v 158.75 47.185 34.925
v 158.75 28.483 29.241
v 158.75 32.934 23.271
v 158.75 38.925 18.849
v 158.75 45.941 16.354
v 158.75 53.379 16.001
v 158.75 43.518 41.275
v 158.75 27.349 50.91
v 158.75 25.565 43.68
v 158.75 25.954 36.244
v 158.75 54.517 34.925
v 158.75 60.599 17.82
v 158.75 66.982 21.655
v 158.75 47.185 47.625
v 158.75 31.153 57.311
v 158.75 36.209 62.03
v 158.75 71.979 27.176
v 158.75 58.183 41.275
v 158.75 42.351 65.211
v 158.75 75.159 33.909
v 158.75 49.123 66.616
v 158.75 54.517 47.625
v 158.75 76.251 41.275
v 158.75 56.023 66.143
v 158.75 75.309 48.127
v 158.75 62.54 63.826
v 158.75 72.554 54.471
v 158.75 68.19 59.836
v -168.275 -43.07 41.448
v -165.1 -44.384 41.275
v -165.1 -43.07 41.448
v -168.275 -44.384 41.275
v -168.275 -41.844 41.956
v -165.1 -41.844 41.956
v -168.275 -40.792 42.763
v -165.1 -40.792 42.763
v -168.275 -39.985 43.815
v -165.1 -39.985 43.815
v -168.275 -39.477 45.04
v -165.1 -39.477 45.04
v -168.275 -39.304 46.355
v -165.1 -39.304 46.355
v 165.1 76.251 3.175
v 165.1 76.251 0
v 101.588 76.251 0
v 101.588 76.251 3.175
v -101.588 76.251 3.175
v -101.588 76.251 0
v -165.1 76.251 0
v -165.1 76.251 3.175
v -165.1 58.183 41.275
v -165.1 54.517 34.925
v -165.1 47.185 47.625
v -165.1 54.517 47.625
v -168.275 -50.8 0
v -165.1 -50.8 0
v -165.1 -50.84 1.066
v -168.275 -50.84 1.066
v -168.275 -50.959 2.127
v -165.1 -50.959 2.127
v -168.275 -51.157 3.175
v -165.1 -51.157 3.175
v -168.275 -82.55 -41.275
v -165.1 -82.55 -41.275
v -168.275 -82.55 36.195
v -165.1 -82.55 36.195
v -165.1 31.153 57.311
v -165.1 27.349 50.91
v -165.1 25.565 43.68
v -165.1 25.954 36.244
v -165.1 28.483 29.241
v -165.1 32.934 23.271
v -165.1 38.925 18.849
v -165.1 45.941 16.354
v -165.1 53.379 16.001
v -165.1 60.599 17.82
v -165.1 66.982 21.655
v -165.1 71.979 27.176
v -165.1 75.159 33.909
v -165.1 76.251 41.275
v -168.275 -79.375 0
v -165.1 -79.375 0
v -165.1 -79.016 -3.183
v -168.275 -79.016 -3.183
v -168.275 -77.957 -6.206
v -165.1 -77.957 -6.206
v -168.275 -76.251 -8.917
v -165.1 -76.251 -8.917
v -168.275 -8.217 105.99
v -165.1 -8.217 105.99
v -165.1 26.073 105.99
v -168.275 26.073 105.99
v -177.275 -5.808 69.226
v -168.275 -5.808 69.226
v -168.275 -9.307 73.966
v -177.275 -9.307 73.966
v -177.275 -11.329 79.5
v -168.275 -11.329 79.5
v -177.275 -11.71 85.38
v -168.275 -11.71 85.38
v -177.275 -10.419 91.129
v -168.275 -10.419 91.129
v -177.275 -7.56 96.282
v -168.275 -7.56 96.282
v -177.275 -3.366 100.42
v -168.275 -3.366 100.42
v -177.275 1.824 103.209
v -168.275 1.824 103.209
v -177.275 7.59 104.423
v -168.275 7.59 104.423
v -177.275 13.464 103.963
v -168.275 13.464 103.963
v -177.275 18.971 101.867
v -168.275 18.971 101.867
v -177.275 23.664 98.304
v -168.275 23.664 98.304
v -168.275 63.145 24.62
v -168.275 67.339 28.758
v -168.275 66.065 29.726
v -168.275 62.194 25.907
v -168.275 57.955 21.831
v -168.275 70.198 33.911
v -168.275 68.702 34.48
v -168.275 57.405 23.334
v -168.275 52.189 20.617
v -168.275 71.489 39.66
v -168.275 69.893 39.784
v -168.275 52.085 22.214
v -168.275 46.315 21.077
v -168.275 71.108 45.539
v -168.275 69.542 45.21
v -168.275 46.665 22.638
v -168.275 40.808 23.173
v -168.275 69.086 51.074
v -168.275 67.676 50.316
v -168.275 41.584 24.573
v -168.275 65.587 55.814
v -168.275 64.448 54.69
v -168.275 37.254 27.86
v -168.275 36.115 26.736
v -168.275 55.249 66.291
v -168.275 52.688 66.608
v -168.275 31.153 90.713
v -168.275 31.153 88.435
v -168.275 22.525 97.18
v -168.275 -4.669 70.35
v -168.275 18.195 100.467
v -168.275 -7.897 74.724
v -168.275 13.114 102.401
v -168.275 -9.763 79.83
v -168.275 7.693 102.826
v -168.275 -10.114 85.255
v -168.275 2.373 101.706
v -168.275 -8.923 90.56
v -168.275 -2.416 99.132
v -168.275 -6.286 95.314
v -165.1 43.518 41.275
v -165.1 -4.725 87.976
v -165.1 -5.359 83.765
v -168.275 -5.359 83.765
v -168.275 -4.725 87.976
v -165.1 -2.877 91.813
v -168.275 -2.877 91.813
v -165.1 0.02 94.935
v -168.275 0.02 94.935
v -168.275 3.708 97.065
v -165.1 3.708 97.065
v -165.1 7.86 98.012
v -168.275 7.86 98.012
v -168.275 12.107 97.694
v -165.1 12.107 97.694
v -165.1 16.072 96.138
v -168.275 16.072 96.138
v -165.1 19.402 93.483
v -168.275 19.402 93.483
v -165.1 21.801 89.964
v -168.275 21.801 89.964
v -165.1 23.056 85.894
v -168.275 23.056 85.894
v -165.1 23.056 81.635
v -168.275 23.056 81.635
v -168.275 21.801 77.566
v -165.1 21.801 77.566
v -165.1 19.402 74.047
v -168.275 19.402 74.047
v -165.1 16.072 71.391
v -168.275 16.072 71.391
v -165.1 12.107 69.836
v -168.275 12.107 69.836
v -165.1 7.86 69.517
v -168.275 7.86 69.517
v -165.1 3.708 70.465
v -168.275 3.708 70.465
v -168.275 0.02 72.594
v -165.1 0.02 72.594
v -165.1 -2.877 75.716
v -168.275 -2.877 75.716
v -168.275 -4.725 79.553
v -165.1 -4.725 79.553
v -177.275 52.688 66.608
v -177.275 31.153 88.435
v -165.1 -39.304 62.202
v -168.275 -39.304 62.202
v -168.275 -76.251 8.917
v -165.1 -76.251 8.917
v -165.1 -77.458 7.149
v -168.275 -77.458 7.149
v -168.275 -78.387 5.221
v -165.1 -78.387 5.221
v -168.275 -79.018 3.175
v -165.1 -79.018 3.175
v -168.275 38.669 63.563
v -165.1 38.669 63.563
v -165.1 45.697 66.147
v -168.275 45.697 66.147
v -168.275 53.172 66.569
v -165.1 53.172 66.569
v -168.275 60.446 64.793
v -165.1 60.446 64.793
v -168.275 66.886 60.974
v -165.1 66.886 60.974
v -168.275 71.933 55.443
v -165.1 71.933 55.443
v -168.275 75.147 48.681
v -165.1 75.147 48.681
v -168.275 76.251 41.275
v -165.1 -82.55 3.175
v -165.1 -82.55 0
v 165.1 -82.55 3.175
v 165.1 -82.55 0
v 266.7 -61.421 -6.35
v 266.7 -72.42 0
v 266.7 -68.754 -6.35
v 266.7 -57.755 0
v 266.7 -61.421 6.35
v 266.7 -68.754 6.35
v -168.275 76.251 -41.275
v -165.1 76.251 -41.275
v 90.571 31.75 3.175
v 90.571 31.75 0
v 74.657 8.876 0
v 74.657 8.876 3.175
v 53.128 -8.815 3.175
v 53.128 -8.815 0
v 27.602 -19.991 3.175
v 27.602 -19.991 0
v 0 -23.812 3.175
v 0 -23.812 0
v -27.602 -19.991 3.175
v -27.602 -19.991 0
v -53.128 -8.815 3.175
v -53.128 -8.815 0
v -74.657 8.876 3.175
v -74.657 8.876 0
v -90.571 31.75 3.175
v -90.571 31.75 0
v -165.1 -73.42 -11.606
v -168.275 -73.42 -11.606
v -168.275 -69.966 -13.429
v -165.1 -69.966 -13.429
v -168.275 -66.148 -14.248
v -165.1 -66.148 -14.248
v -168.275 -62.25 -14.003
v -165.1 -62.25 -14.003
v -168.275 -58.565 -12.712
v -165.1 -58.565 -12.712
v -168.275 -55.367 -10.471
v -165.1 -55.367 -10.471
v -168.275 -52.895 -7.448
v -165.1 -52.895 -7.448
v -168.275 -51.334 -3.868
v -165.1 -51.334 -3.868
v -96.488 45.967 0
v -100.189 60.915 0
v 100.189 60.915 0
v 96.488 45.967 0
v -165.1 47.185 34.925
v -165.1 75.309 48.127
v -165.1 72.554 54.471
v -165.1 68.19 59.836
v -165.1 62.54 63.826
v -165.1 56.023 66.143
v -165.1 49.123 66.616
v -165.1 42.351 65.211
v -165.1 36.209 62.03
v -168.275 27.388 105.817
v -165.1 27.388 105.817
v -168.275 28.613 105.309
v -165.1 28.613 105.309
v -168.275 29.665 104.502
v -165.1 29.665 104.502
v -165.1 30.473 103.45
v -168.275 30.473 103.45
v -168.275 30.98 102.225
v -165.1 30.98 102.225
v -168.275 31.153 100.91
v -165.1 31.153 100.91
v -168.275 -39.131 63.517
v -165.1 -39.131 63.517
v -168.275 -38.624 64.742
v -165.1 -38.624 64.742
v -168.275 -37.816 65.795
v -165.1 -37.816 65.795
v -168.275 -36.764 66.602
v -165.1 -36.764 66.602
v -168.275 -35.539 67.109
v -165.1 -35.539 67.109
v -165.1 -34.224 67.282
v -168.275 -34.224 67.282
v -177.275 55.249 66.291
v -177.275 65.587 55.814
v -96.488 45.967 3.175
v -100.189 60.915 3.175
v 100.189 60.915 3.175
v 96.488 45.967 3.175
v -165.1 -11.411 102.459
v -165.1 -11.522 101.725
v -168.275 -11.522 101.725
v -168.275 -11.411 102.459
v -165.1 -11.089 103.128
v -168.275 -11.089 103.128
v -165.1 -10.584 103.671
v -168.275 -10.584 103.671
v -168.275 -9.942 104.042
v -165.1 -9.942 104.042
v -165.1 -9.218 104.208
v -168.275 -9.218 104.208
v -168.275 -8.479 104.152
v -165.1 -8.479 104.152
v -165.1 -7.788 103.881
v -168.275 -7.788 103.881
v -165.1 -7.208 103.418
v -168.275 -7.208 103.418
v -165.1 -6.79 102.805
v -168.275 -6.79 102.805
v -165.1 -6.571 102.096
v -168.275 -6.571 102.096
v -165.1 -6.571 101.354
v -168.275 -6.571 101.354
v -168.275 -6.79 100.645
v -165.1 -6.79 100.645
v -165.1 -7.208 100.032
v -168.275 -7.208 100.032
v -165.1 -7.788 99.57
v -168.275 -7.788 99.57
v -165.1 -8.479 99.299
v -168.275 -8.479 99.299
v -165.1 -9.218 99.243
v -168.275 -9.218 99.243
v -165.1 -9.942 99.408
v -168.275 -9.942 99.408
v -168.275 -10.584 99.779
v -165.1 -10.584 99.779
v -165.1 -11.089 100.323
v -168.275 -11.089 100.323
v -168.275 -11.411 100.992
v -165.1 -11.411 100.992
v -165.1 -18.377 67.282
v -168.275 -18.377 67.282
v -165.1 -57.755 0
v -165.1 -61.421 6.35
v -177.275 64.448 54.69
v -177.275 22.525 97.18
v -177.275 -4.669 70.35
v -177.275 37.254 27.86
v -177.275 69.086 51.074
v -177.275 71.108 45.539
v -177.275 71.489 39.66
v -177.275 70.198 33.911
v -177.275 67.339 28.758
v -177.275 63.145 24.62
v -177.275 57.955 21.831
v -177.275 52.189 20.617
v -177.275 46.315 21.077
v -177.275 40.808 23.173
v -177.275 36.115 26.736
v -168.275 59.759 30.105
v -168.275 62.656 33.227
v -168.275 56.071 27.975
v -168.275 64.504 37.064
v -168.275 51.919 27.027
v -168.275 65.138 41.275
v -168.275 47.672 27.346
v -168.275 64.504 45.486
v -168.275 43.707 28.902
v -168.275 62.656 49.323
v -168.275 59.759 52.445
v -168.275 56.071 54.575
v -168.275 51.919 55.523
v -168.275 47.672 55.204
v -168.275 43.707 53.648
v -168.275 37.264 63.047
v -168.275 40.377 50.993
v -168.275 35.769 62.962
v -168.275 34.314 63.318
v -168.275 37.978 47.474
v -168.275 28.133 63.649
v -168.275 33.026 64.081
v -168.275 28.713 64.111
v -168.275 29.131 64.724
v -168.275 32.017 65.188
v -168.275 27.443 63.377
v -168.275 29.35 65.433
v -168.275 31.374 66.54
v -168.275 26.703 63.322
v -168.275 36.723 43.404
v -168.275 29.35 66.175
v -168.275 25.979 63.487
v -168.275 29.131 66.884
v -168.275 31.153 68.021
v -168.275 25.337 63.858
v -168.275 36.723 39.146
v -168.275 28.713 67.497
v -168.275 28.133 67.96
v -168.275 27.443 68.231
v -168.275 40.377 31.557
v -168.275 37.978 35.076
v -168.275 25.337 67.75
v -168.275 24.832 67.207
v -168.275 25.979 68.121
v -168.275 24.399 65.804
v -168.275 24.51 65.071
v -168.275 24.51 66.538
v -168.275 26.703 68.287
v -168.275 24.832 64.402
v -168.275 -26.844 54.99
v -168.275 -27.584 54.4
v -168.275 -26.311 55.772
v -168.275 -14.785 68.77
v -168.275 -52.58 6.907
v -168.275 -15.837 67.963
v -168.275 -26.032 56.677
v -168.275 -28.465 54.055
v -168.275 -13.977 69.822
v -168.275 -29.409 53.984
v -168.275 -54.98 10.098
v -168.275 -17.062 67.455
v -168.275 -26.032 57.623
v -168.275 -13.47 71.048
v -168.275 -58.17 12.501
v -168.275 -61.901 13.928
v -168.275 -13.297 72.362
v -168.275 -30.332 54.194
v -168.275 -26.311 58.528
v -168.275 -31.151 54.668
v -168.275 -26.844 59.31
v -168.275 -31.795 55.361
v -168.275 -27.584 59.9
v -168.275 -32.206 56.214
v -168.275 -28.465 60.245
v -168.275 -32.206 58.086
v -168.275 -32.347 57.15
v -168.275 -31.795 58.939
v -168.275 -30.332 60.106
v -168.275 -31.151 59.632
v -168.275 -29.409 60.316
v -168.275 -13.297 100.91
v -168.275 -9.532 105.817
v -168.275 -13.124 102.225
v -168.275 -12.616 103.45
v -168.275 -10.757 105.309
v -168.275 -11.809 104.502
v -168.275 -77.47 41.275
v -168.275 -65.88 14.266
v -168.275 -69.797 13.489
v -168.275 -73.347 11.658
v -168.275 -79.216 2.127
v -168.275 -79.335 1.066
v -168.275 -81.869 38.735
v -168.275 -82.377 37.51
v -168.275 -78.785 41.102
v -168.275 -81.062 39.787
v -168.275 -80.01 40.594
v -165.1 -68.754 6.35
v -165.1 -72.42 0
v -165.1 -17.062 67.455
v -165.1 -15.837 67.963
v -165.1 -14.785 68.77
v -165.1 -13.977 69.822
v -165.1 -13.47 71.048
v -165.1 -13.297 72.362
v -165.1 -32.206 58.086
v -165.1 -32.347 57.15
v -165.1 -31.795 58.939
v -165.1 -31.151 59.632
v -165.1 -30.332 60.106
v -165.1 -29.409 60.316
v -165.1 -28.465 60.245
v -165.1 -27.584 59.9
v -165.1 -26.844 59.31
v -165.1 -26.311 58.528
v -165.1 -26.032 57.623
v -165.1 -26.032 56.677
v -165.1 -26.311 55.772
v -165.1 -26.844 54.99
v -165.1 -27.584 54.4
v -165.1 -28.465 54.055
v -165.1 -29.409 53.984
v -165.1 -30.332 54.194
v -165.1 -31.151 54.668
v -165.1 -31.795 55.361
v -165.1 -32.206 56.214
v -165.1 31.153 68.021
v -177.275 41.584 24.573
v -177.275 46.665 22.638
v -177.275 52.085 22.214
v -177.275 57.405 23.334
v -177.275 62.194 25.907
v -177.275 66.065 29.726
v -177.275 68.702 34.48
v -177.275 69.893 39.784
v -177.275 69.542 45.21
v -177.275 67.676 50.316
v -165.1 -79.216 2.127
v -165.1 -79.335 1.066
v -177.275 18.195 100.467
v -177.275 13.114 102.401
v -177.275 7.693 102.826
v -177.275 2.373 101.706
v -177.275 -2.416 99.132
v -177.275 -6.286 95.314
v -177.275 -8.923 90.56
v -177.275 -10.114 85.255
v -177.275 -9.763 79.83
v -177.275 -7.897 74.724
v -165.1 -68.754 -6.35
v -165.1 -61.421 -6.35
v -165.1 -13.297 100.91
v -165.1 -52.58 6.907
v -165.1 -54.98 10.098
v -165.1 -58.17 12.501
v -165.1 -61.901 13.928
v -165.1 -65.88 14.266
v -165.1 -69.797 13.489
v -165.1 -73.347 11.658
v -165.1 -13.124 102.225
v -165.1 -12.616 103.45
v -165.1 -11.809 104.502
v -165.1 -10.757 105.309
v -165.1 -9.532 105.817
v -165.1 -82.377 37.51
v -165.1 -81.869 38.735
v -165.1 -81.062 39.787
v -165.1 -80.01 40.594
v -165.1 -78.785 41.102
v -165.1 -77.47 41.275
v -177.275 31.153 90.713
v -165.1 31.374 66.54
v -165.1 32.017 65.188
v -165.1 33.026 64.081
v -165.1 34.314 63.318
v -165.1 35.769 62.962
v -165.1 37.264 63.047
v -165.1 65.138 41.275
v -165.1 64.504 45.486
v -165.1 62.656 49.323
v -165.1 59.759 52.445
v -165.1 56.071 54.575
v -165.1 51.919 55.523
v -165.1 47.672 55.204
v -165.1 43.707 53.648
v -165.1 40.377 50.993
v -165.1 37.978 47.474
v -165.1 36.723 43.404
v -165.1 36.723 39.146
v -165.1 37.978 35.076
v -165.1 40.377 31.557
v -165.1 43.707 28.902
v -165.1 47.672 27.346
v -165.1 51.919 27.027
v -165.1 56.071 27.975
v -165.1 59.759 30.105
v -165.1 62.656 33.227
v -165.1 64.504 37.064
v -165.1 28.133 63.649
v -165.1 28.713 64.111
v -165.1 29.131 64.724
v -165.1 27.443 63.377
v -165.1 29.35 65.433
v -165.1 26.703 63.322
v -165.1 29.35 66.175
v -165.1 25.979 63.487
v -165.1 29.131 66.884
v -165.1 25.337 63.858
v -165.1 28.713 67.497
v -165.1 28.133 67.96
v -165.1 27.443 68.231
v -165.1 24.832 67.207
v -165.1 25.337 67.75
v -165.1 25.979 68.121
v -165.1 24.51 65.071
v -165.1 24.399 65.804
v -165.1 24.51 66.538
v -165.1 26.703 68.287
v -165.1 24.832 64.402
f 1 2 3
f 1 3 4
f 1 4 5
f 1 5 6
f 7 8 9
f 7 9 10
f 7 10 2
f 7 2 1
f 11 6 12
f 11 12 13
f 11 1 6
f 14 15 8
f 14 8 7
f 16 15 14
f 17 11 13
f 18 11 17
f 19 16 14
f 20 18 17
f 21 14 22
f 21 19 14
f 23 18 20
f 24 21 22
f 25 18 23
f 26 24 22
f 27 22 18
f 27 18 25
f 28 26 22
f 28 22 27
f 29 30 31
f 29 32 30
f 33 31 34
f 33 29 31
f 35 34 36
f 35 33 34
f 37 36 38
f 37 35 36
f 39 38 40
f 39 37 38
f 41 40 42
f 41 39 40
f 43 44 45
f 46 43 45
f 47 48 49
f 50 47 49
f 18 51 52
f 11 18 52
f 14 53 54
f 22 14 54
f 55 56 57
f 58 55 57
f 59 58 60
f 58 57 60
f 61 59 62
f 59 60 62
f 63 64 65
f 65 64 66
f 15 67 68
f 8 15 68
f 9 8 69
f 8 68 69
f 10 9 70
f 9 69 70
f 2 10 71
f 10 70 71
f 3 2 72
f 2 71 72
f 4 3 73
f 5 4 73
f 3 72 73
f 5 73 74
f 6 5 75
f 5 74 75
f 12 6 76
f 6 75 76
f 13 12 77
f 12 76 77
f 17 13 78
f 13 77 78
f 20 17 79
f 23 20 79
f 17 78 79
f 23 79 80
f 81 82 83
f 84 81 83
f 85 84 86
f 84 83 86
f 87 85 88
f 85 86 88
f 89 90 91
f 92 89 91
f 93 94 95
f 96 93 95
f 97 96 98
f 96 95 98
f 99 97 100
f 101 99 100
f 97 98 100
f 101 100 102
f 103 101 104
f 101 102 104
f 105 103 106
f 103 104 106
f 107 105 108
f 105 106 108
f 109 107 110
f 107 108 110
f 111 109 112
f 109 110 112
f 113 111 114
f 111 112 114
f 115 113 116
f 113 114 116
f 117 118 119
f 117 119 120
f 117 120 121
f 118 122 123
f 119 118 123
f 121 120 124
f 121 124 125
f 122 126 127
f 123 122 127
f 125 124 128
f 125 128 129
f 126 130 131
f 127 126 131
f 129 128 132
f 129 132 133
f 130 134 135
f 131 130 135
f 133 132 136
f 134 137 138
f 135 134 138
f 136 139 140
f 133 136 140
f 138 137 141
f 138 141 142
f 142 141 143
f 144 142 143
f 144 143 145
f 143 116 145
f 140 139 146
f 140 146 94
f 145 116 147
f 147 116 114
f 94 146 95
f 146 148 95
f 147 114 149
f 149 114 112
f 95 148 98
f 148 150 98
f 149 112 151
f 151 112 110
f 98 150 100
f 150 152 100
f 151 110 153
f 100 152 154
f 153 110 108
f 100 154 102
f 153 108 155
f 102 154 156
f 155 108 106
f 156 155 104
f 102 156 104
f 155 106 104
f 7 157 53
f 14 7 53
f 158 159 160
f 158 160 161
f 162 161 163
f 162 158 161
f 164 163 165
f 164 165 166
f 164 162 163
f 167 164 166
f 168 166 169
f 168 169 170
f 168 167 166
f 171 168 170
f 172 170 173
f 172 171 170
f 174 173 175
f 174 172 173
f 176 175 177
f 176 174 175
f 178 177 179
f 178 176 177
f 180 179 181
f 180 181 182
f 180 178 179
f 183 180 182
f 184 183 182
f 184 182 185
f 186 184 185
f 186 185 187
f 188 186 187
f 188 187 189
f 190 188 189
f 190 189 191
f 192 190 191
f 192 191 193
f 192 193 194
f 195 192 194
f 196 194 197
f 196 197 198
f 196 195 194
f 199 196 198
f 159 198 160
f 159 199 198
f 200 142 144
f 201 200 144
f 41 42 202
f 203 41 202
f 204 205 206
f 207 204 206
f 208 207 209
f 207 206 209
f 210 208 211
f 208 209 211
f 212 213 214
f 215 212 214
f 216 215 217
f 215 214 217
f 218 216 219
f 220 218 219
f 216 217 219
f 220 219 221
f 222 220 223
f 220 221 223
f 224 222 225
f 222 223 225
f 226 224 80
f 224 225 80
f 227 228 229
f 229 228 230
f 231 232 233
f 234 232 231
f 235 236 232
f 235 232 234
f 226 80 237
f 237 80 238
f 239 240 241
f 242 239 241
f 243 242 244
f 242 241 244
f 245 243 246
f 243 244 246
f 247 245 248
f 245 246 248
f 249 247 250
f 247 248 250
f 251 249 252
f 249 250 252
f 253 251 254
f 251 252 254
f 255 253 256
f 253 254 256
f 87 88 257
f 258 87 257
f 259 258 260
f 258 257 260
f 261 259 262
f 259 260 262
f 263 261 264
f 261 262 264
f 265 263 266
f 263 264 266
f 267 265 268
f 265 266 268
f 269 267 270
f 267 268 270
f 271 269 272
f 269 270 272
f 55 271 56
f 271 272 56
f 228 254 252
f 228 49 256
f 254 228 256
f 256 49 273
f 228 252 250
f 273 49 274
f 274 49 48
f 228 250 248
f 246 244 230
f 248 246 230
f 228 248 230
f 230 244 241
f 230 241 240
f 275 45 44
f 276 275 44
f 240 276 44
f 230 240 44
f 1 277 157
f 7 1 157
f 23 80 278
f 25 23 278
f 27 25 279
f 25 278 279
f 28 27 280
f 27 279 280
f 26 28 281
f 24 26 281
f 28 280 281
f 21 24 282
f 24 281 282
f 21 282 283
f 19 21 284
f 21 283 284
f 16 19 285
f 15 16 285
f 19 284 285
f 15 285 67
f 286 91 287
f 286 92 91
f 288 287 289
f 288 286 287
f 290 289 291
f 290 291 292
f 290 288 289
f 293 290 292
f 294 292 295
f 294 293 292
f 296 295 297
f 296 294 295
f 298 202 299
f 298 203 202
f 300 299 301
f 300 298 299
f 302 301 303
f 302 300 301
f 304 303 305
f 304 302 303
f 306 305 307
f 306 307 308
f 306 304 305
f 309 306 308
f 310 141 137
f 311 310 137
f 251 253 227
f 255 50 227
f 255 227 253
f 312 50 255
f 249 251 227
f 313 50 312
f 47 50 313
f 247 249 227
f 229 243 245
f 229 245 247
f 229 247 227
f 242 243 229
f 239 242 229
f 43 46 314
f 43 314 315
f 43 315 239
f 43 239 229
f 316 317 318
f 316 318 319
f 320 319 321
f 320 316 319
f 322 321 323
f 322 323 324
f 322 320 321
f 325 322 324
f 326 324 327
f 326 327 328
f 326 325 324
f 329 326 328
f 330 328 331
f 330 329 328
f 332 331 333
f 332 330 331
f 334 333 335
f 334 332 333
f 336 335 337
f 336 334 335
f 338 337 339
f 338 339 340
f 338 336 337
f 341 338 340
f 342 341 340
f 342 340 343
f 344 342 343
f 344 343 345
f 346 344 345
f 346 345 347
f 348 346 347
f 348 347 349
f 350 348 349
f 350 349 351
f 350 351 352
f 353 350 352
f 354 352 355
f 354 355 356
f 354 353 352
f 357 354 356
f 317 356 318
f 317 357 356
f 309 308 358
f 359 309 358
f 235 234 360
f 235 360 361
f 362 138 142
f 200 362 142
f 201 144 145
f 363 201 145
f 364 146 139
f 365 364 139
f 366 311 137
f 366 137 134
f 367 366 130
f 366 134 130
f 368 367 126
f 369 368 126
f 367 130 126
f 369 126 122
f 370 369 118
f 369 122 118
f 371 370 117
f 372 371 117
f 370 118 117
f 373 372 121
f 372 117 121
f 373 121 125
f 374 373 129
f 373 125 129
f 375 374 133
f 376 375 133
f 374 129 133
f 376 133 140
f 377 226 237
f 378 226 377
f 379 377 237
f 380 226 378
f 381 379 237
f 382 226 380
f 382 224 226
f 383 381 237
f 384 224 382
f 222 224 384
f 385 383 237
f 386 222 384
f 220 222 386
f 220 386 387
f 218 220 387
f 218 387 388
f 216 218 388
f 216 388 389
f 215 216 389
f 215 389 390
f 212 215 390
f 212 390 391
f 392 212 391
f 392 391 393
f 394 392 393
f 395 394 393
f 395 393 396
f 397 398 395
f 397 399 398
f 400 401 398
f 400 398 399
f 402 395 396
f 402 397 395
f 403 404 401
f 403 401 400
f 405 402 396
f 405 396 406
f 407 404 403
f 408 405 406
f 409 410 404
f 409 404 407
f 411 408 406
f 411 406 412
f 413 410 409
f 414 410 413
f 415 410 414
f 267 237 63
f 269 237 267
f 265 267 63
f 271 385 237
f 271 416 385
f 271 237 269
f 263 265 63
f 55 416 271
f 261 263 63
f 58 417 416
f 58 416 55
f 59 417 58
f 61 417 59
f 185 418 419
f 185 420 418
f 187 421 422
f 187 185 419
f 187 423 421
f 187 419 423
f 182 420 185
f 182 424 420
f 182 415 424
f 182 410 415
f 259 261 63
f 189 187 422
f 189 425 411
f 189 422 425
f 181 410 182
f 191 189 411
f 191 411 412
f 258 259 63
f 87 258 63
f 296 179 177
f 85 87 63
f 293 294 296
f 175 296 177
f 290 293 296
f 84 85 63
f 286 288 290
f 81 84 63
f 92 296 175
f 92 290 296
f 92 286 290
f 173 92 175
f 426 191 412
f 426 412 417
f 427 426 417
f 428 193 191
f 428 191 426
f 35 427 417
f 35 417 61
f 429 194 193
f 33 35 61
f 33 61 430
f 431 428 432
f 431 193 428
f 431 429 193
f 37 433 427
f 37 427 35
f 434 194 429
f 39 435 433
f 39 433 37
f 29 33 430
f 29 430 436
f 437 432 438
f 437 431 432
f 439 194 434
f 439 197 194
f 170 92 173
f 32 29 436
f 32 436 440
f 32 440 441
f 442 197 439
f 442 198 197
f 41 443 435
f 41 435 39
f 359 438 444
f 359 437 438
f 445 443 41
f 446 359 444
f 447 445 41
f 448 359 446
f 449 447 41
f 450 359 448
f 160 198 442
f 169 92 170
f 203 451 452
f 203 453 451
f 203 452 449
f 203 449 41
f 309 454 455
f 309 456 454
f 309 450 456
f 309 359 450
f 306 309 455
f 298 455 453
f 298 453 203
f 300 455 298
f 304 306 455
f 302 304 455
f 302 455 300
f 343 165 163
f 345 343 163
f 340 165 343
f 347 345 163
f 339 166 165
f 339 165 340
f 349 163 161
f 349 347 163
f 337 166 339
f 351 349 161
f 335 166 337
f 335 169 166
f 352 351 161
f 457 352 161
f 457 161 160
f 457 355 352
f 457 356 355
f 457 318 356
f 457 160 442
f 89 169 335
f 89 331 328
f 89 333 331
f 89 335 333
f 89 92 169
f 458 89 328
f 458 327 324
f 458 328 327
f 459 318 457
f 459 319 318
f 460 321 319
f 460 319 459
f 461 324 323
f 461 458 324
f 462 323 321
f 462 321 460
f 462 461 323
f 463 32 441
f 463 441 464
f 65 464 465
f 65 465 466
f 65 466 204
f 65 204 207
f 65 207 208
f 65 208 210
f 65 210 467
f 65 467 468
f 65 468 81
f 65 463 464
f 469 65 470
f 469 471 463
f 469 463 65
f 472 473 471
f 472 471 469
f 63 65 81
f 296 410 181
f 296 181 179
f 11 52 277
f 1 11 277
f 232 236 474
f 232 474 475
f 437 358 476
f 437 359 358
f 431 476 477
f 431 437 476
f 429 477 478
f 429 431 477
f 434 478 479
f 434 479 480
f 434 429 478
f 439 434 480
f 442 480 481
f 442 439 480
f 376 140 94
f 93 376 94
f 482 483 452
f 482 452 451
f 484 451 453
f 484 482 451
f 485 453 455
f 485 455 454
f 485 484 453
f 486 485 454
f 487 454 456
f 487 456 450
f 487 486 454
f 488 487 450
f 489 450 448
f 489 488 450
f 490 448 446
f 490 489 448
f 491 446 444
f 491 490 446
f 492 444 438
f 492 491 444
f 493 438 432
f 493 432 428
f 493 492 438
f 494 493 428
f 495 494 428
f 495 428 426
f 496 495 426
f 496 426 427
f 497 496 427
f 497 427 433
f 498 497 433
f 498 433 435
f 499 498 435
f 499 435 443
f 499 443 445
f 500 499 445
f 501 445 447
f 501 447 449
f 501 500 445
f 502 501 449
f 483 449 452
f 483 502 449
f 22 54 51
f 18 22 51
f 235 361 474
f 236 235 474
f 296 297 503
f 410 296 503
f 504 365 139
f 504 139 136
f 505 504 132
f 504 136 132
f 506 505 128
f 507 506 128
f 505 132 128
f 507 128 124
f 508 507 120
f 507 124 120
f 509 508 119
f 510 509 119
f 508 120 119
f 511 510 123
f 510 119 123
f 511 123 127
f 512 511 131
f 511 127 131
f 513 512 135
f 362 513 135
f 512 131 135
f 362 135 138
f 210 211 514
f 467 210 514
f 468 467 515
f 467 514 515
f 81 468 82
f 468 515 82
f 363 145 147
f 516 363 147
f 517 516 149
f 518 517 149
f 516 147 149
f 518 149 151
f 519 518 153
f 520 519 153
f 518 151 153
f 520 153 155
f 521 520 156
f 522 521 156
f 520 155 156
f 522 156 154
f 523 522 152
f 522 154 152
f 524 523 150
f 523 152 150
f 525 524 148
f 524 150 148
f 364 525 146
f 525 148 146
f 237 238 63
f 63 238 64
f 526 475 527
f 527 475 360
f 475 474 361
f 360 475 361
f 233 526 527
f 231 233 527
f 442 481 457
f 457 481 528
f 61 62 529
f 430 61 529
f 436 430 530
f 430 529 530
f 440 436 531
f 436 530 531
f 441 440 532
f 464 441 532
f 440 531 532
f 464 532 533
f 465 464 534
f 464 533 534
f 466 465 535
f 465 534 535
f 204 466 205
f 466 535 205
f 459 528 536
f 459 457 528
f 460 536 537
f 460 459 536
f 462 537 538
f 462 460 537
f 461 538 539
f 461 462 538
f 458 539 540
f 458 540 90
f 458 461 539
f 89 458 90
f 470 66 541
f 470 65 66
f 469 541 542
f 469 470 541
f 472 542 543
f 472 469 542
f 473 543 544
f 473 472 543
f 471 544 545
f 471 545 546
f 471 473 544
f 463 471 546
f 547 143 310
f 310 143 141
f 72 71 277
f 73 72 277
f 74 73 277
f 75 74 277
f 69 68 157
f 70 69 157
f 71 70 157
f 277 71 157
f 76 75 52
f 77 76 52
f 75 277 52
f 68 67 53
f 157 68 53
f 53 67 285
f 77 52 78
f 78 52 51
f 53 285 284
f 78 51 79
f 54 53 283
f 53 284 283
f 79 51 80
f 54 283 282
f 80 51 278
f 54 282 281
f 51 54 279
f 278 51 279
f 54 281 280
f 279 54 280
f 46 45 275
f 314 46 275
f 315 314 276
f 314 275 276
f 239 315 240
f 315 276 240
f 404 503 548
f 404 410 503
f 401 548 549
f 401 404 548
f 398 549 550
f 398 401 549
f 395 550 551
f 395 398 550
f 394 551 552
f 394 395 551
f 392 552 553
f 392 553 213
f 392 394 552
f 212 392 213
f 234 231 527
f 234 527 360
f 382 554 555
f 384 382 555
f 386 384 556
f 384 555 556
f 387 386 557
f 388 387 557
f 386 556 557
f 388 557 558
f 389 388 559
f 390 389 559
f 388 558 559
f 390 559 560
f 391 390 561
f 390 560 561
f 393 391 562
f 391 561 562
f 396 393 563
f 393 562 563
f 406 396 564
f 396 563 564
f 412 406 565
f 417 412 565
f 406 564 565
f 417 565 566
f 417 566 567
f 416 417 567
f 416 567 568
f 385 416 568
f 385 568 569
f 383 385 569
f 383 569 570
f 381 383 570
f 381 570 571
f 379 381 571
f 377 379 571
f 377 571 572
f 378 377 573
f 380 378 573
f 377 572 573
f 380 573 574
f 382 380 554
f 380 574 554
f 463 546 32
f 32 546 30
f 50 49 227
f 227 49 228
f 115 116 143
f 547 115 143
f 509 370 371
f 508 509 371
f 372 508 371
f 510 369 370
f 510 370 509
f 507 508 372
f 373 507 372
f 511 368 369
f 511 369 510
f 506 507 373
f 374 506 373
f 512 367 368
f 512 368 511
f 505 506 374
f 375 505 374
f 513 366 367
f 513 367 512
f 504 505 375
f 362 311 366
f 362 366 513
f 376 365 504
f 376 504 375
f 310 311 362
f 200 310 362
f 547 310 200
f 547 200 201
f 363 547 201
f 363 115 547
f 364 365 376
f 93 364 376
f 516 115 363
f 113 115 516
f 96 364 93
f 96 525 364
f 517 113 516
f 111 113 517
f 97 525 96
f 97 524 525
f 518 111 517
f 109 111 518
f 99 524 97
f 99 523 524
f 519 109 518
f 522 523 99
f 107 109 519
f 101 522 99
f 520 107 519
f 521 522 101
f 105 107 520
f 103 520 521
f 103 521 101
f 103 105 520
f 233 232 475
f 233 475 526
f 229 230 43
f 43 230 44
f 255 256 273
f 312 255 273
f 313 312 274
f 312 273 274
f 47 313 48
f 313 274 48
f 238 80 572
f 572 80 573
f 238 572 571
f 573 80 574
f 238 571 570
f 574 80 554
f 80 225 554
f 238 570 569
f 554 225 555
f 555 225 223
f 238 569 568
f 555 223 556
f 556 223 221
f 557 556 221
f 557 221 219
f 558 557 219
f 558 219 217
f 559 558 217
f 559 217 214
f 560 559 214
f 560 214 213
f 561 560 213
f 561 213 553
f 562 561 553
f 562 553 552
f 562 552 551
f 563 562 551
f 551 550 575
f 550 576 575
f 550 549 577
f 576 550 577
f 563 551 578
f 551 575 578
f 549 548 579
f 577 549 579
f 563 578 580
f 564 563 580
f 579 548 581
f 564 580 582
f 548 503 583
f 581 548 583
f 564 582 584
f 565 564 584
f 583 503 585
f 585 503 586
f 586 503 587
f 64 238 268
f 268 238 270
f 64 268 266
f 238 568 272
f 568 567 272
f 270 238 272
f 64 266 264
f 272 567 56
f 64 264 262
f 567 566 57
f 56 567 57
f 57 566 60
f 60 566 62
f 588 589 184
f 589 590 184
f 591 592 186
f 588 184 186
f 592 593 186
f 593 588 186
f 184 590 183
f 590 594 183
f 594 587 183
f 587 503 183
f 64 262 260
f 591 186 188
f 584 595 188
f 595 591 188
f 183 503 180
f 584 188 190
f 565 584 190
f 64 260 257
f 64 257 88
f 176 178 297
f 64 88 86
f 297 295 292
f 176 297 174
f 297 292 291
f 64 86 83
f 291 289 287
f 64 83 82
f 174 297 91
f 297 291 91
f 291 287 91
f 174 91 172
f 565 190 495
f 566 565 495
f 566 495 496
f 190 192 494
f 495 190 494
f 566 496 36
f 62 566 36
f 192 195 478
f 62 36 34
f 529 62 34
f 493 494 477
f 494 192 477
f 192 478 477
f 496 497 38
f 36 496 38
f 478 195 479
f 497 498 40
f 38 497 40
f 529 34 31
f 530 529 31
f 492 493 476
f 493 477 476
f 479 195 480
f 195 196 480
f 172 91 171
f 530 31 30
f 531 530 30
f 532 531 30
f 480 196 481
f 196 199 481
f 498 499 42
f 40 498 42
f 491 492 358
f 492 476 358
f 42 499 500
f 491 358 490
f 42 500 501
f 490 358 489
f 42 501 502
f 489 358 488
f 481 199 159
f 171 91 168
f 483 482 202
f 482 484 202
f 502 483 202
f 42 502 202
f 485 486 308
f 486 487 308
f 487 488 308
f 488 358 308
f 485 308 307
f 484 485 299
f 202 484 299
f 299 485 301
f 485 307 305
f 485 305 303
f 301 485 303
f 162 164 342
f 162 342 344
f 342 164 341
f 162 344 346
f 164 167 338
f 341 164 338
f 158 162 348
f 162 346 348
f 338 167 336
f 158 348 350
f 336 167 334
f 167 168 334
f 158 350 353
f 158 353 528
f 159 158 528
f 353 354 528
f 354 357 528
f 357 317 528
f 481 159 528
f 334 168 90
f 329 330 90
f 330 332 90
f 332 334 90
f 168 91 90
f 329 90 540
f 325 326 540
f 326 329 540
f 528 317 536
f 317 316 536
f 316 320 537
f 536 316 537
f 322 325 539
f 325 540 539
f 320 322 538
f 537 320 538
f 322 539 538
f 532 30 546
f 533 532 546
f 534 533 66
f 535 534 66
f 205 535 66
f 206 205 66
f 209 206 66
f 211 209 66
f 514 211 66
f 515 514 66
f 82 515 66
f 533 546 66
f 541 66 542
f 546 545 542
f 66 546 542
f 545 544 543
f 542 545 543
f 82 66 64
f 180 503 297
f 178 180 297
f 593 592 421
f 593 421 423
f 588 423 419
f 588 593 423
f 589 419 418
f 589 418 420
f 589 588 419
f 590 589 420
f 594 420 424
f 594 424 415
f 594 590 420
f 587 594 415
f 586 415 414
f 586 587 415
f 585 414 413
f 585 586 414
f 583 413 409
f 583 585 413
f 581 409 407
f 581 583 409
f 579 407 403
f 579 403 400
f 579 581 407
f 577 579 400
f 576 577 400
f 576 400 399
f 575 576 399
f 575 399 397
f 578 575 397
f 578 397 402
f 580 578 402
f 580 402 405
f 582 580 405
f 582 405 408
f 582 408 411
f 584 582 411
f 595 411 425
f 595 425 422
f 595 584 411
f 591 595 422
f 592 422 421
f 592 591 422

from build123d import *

# Parameters (mm, degrees)
F0_W     = 17.6947293282
F0_H     = 38.2016
F0_W_2   = 6.35
F0_H_2   = 28.575
F1_DEPTH = 3.175
F2_R     = 3.175
F2_R_2   = 2.4892
F2_R_3   = 14.2875
F3_DEPTH = 3.175
F4_R     = 14.2875
F5_DEPTH = 323.85
F6_DEPTH = 431.8
F8_DEPTH = 9
F9_R     = 5.08


# Not quite as in the source:
# - a feature names something its author has since deleted; it is built from what else it names


with BuildPart() as f1:
    # F0 (on Top) → F1 (new body)
    with BuildSketch(Plane.XY):
        with BuildLine():
            ThreePointArc((-90.5710140925, 31.75), (-98.622453308, 53.3708723969), (-101.5883780415, 76.2508))
            Line((-101.5883780415, 76.2508), (-147.4052706718, 76.2508))
            Line((-147.4052706718, 76.2508), (-147.4052706718, 38.0492))
            Line((-147.4052706718, 38.0492), (-165.1, 38.0492))
            Line((-165.1, 38.0492), (-165.1, 31.75))
            Line((-165.1, 31.75), (-90.5710140925, 31.75))
        make_face()
        with Locations((-156.2526353359, 57.15)):
            Rectangle(F0_W, F0_H)
        with BuildLine():
            Line((165.1, 76.2508), (101.5883780415, 76.2508))
            ThreePointArc((101.5883780415, 76.2508), (98.622453308, 53.3708723969), (90.5710140925, 31.75))
            Line((90.5710140925, 31.75), (165.1, 31.75))
            Line((165.1, 31.75), (165.1, 76.2508))
        make_face()
        with BuildLine():
            ThreePointArc((90.5710140925, 31.75), (0, -23.8125), (-90.5710140925, 31.75))
            Line((-90.5710140925, 31.75), (-165.1, 31.75))
            Line((-165.1, 31.75), (-165.1, -47.625))
            Line((-165.1, -47.625), (-158.75, -47.625))
            Line((-158.75, -47.625), (-158.75, -76.2))
            Line((-158.75, -76.2), (-165.1, -76.2))
            Line((-165.1, -76.2), (-165.1, -82.55))
            Line((-165.1, -82.55), (165.1, -82.55))
            Line((165.1, -82.55), (165.1, 31.75))
            Line((165.1, 31.75), (90.5710140925, 31.75))
        make_face()
        with Locations((-161.925, -61.9125)):
            Rectangle(F0_W_2, F0_H_2)
    extrude(amount=F1_DEPTH)


with BuildPart() as f3:
    # F2 (on face) → F3 (new body)
    with BuildSketch(Plane(origin=(-165.1, 0, 0), x_dir=(0, -1, 0), z_dir=(-1, 0, 0))):
        with BuildLine():
            Line((-31.1531, 41.275), (-36.5633, 41.275))
            ThreePointArc((-36.5633, 41.275), (-50.8508, 26.9875), (-65.1383, 41.275))
            Line((-65.1383, 41.275), (-76.2508, 41.275))
            ThreePointArc((-76.2508, 41.275), (-50.8508, 15.875), (-25.4508, 41.275))
            Line((-25.4508, 41.275), (-31.1531, 41.275))
        make_face()
        with BuildLine():
            Line((-31.1531, 57.3112281946), (-31.1531, 41.275))
            Line((-31.1531, 41.275), (-25.4508, 41.275))
            ThreePointArc((-25.4508, 41.275), (-26.9187965318, 49.7849477084), (-31.1531, 57.3112281946))
        make_face()
        with BuildLine():
            Line((50.8, 0), (-76.2508, 0))
            Line((-76.2508, 0), (-76.2508, -41.275))
            Line((-76.2508, -41.275), (76.2508, -41.275))
            Line((76.2508, -41.275), (76.2508, -8.9170280565))
            ThreePointArc((76.2508, -8.9170280565), (60.3632536315, -13.4838478373), (50.8, 0))
        make_face()
        with BuildLine():
            Line((76.2508, 41.275), (76.2508, 8.9170280565))
            ThreePointArc((76.2508, 8.9170280565), (77.9585667504, 6.2022815929), (79.017755965, 3.175))
            Line((79.017755965, 3.175), (82.55, 3.175))
            Line((82.55, 3.175), (82.55, 41.275))
            Line((82.55, 41.275), (76.2508, 41.275))
        make_face()
        with BuildLine():
            Line((76.2508, -8.9170280565), (76.2508, -41.275))
            Line((76.2508, -41.275), (82.55, -41.275))
            Line((82.55, -41.275), (82.55, 0))
            Line((82.55, 0), (79.375, 0))
            ThreePointArc((79.375, 0), (78.5713478373, -4.7242463685), (76.2508, -8.9170280565))
        make_face()
        Polygon((13.2969, 61.5398025967), (13.2969, 41.275), (39.3043012984, 41.275), (39.3043012984, 67.2824012984), (13.2969, 67.2824012984), align=None)
        with Locations((29.1719, 57.15)):
            Circle(F2_R, mode=Mode.SUBTRACT)
        with BuildLine():
            ThreePointArc((-31.1531, 57.3112281946), (-26.9187965318, 49.7849477084), (-25.4508, 41.275))
            Line((-25.4508, 41.275), (13.2969, 41.275))
            Line((13.2969, 41.275), (13.2969, 61.5398025967))
            Line((13.2969, 61.5398025967), (-31.1531, 61.5398025967))
            Line((-31.1531, 61.5398025967), (-31.1531, 57.3112281946))
        make_face()
        with BuildLine():
            Line((51.157244035, 3.175), (-76.2508, 3.175))
            Line((-76.2508, 3.175), (-76.2508, 0))
            Line((-76.2508, 0), (50.8, 0))
            ThreePointArc((50.8, 0), (50.8895919085, 1.5975174726), (51.157244035, 3.175))
        make_face()
        with BuildLine():
            Line((82.55, 3.175), (79.017755965, 3.175))
            ThreePointArc((79.017755965, 3.175), (79.2854080915, 1.5975174726), (79.375, 0))
            Line((79.375, 0), (82.55, 0))
            Line((82.55, 0), (82.55, 3.175))
        make_face()
        Polygon((-31.1531, 105.9898025967), (-31.1531, 61.5398025967), (13.2969, 61.5398025967), (13.2969, 67.2824012984), (13.2969, 73.025), (13.2969, 105.9898025967), align=None)
        with Locations((-26.8886122421, 65.8042903546)):
            Circle(F2_R_2, mode=Mode.SUBTRACT)
        with Locations((-8.9281, 83.7648025967)):
            Circle(F2_R_3, mode=Mode.SUBTRACT)
        with Locations((9.0324122421, 101.7253148389)):
            Circle(F2_R_2, mode=Mode.SUBTRACT)
        with BuildLine():
            Line((13.2969, 41.275), (-25.4508, 41.275))
            ThreePointArc((-25.4508, 41.275), (-50.8508, 15.875), (-76.2508, 41.275))
            Line((-76.2508, 41.275), (-76.2508, 3.175))
            Line((-76.2508, 3.175), (51.157244035, 3.175))
            ThreePointArc((51.157244035, 3.175), (61.9005370447, 13.9275239498), (76.2508, 8.9170280565))
            Line((76.2508, 8.9170280565), (76.2508, 41.275))
            Line((76.2508, 41.275), (45.0469, 41.275))
            Line((45.0469, 41.275), (39.3043012984, 41.275))
            Line((39.3043012984, 41.275), (13.2969, 41.275))
        make_face()
        with BuildLine():
            ThreePointArc((-65.1383, 41.275), (-50.8508, 55.5625), (-36.5633, 41.275))
            Line((-36.5633, 41.275), (-31.1531, 41.275))
            Line((-31.1531, 41.275), (-31.1531, 57.3112281946))
            ThreePointArc((-31.1531, 57.3112281946), (-59.3607477084, 65.2070034682), (-76.2508, 41.275))
            Line((-76.2508, 41.275), (-65.1383, 41.275))
        make_face()
    extrude(amount=F3_DEPTH)

    # F9
    f9_edges = [f3.edges().sort_by_distance(p)[0] for p in [
        (-166.6875, 76.2508, 41.275),
        (-166.6875, -39.304301, 41.275),
        (-166.6875, -82.55, 41.275),
        (-166.6875, -39.304301, 67.282401),
        (-166.6875, -13.2969, 67.282401),
        (-166.6875, -13.2969, 105.989803),
        (-166.6875, 31.1531, 105.989803),
        (-166.6875, 31.1531, 57.311228),
    ]]
    fillet(f9_edges, radius=F9_R)


with BuildPart() as f5:
    # F4 (on face) → F5 (new body)
    with BuildSketch(Plane.YZ.offset(-165.1)):
        with BuildLine():
            ThreePointArc((31.1531, 57.3112281946), (42.3408522916, 17.3429965318), (76.2508, 41.275))
            ThreePointArc((76.2508, 41.275), (59.3607477084, 65.2070034682), (31.1531, 57.3112281946))
        make_face()
        with Locations((50.8508, 41.275)):
            Circle(F4_R, mode=Mode.SUBTRACT)
        with Locations((50.8508, 41.275)):
            Circle(F4_R)
        Polygon((43.5184515813, 41.275), (47.1846257906, 47.625), (54.5169742094, 47.625), (58.1831484187, 41.275), (54.5169742094, 34.925), (47.1846257906, 34.925), align=None, mode=Mode.SUBTRACT)
    extrude(amount=F5_DEPTH)


with BuildPart() as f6:
    # F4 (on face) → F6 (new body)
    with BuildSketch(Plane.YZ.offset(-165.1)):
        Polygon((-61.4213257906, 6.35), (-68.7536742094, 6.35), (-72.4198484187, 0), (-68.7536742094, -6.35), (-61.4213257906, -6.35), (-57.7551515813, 0), align=None)
    extrude(amount=F6_DEPTH)


with BuildPart() as f8:
    # F7 (on face) → F8 (new body)
    with BuildSketch(Plane(origin=(-168.275, 0, 0), x_dir=(0, -1, 0), z_dir=(-1, 0, 0))):
        with BuildLine():
            ThreePointArc((-37.254063169, 27.859736), (-64.266064, 27.678263169), (-64.447536831, 54.690264))
            Line((-64.447536831, 54.690264), (-52.6884316676, 66.6084385715))
            ThreePointArc((-52.6884316676, 66.6084385715), (-53.9729276626, 66.4823861965), (-55.2493622465, 66.2912477235))
            Line((-55.2493622465, 66.2912477235), (-65.5866251559, 55.8141491489))
            ThreePointArc((-65.5866251559, 55.8141491489), (-65.3899491489, 26.5391748441), (-36.1149748441, 26.7358508511))
            Line((-36.1149748441, 26.7358508511), (5.8077251559, 69.2256534478))
            ThreePointArc((5.8077251559, 69.2256534478), (5.6110491489, 98.5006277526), (-23.6639251559, 98.3039517457))
            Line((-23.6639251559, 98.3039517457), (-31.1531, 90.7134682907))
            Line((-31.1531, 90.7134682907), (-31.1531, 88.4350859823))
            Line((-31.1531, 88.4350859823), (-22.524836831, 97.1800665967))
            ThreePointArc((-22.524836831, 97.1800665967), (4.487164, 97.3615394277), (4.668636831, 70.3495385967))
            Line((4.668636831, 70.3495385967), (-37.254063169, 27.859736))
        make_face()
        with BuildLine():
            ThreePointArc((-55.2493622465, 66.2912477235), (-53.9729276626, 66.4823861965), (-52.6884316676, 66.6084385715))
            Line((-52.6884316676, 66.6084385715), (-31.1531, 88.4350859823))
            Line((-31.1531, 88.4350859823), (-31.1531, 90.7134682907))
            Line((-31.1531, 90.7134682907), (-55.2493622465, 66.2912477235))
        make_face()
    extrude(amount=F8_DEPTH)


solid = Compound([f1.part, f3.part, f5.part, f6.part, f8.part])
